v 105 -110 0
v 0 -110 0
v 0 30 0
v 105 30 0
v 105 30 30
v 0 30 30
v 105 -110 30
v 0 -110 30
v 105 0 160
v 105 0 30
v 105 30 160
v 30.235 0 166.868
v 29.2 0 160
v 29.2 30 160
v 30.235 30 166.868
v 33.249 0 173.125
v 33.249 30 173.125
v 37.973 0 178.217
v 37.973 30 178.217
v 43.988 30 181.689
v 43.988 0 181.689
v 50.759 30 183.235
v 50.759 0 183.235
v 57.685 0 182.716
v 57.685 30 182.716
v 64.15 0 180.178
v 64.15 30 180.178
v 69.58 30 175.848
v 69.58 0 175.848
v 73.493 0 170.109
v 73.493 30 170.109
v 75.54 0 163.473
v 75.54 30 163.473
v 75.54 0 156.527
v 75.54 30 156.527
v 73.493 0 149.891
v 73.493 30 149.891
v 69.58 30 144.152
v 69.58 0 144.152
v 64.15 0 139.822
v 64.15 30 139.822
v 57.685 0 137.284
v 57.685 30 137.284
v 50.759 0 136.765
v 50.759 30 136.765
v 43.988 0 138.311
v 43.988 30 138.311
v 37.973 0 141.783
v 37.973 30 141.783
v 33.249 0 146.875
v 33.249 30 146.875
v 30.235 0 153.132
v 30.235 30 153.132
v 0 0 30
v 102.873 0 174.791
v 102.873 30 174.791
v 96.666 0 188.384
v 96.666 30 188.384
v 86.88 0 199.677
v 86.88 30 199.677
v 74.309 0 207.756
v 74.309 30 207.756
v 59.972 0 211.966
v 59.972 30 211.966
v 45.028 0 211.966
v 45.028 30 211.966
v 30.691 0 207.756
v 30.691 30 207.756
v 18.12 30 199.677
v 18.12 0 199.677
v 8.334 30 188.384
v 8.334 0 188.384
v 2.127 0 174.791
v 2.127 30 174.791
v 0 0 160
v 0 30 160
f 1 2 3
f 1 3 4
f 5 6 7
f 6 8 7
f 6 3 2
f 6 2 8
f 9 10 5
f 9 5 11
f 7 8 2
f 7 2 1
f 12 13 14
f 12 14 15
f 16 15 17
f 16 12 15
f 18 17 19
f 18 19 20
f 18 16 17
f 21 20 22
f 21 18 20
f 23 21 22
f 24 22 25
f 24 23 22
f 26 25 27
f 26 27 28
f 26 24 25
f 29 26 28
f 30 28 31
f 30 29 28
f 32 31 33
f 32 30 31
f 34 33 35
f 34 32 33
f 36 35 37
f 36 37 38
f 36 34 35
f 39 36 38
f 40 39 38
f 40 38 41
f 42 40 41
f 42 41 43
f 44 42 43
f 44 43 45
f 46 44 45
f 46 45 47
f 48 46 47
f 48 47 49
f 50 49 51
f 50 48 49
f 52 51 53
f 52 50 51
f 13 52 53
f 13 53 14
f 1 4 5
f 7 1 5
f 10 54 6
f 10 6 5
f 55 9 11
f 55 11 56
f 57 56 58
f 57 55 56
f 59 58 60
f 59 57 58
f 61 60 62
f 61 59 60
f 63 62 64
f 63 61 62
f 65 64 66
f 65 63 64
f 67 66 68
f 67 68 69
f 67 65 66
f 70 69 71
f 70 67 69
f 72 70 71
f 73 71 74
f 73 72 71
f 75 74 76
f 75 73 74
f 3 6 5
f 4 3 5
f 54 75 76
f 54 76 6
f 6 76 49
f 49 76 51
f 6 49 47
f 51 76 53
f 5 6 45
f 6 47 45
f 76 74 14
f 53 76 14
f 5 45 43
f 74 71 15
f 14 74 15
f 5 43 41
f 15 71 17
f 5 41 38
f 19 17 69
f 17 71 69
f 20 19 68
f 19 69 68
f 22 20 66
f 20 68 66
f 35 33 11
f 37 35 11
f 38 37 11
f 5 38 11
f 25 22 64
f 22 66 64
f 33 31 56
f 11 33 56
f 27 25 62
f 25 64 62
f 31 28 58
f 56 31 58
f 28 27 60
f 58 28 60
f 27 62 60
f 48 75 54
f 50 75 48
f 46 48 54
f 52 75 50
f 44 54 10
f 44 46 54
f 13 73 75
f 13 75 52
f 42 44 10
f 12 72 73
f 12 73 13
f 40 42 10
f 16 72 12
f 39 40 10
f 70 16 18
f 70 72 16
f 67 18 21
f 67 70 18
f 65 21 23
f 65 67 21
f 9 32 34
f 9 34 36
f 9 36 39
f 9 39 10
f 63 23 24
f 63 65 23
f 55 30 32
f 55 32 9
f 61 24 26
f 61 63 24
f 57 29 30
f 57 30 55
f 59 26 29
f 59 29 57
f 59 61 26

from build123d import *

# Parameters (mm, degrees)
F0_W          = 105
F0_H          = 30
F1_DEPTH      = 110
F1_DEPTH_BACK = 30
F2_DEPTH      = 30


# Not quite as in the source:
# - a feature of the source that left no trace in its solid (it failed there, or was rolled back) is left out


with BuildPart() as f1:
    # F0 (on Front) → F1 (new body, two sides)
    with BuildSketch(Plane.XZ) as f1_sk:
        with Locations((52.5, 15)):
            Rectangle(F0_W, F0_H)
    extrude(amount=F1_DEPTH)
    extrude(f1_sk.sketch, amount=-F1_DEPTH_BACK)


with BuildPart() as f2:
    # F0 (on Front) → F2 (new body)
    with BuildSketch(Plane.XZ):
        with BuildLine():
            Line((0, 160), (0, 30))
            Line((0, 30), (105, 30))
            Line((105, 30), (105, 160))
            Line((105, 160), (75.8, 160))
            ThreePointArc((75.8, 160), (52.5, 136.7), (29.2, 160))
            Line((29.2, 160), (0, 160))
        make_face()
        with BuildLine():
            ThreePointArc((105, 160), (52.5, 212.5), (0, 160))
            Line((0, 160), (29.2, 160))
            ThreePointArc((29.2, 160), (52.5, 183.3), (75.8, 160))
            Line((75.8, 160), (105, 160))
        make_face()
    extrude(amount=-F2_DEPTH)


solid = Compound([f1.part, f2.part])
